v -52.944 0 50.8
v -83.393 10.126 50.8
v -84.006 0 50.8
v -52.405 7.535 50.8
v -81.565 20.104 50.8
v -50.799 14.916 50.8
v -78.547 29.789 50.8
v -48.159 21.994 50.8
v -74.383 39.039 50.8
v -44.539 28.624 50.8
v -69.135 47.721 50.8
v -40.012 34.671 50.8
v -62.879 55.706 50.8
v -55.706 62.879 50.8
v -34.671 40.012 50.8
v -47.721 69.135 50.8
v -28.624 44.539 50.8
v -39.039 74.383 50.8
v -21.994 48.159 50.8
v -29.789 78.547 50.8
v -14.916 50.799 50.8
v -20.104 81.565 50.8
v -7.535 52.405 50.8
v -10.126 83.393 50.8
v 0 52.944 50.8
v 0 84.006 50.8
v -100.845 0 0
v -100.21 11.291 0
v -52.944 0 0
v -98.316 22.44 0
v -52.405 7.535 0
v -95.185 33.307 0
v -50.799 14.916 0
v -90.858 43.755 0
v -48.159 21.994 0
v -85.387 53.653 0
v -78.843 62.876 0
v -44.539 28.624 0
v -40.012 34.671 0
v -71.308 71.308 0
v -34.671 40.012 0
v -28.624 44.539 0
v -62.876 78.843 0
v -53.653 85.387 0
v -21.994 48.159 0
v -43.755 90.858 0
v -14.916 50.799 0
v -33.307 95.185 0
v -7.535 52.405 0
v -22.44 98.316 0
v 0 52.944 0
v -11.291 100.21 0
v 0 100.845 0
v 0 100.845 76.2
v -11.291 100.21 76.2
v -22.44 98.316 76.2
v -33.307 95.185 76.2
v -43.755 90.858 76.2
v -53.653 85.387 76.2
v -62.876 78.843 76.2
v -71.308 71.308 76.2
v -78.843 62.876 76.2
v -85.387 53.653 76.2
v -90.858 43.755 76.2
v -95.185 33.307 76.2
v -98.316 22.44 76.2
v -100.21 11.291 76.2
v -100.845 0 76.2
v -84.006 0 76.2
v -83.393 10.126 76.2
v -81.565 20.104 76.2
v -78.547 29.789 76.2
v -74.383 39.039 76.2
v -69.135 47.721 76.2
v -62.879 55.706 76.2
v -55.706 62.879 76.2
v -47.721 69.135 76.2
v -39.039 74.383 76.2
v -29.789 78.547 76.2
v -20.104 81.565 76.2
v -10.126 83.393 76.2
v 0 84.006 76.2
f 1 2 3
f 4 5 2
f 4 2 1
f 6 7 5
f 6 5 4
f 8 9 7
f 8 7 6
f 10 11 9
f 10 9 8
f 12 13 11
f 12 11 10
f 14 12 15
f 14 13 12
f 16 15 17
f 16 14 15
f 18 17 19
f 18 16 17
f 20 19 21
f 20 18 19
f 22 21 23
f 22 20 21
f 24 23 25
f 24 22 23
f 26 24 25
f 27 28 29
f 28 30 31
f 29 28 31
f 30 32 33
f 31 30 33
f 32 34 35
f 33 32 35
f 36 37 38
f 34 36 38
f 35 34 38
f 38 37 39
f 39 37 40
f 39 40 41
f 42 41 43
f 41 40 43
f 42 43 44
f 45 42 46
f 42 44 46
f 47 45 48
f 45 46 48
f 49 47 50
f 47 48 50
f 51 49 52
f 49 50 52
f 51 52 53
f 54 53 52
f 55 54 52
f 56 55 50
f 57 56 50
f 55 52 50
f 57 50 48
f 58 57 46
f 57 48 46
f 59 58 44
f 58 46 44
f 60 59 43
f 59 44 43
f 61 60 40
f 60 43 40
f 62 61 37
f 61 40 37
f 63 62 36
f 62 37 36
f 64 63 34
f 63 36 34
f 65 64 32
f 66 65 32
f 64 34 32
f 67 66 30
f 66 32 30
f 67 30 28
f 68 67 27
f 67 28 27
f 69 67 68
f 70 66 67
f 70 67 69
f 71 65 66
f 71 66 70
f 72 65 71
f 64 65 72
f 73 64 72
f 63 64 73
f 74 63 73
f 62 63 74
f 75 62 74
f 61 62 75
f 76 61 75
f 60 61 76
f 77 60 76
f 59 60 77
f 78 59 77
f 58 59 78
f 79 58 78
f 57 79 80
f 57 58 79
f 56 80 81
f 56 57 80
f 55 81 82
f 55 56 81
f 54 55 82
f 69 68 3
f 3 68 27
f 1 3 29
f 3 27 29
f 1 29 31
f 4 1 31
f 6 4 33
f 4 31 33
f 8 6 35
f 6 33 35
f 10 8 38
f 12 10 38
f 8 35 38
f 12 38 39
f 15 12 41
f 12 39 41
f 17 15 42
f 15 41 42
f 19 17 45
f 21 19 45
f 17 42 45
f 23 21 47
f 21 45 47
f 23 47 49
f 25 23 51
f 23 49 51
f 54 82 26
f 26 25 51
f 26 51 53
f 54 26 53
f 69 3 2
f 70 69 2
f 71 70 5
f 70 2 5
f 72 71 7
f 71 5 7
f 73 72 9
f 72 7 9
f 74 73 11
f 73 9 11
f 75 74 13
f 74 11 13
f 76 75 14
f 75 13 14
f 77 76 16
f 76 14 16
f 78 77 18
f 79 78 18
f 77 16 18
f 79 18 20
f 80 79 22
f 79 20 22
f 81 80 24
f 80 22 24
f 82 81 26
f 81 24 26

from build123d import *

# Parameters (mm, degrees)
F1_DEPTH = 76.2
F2_DEPTH = 50.8


with BuildPart() as f1:
    # F0 (on Top) → F1 (new body)
    with BuildSketch(Plane.XY):
        with BuildLine():
            Line((0, 84.0056133164), (0, 100.8445028668))
            ThreePointArc((0, 100.8445028668), (-71.3078318225, 71.3078318225), (-100.8445028668, 0))
            Line((-100.8445028668, 0), (-84.0056133164, 0))
            ThreePointArc((-84.0056133164, 0), (-59.4009388338, 59.4009388338), (0, 84.0056133164))
        make_face()
    extrude(amount=F1_DEPTH)

    # F0 (on Top) → F2 (join)
    with BuildSketch(Plane.XY):
        with BuildLine():
            Line((0, 52.9438169528), (0, 84.0056133164))
            ThreePointArc((0, 84.0056133164), (-59.4009388338, 59.4009388338), (-84.0056133164, 0))
            Line((-84.0056133164, 0), (-52.9438169528, 0))
            ThreePointArc((-52.9438169528, 0), (-37.4369319892, 37.4369319892), (0, 52.9438169528))
        make_face()
    extrude(amount=F2_DEPTH)


solid = f1.part
